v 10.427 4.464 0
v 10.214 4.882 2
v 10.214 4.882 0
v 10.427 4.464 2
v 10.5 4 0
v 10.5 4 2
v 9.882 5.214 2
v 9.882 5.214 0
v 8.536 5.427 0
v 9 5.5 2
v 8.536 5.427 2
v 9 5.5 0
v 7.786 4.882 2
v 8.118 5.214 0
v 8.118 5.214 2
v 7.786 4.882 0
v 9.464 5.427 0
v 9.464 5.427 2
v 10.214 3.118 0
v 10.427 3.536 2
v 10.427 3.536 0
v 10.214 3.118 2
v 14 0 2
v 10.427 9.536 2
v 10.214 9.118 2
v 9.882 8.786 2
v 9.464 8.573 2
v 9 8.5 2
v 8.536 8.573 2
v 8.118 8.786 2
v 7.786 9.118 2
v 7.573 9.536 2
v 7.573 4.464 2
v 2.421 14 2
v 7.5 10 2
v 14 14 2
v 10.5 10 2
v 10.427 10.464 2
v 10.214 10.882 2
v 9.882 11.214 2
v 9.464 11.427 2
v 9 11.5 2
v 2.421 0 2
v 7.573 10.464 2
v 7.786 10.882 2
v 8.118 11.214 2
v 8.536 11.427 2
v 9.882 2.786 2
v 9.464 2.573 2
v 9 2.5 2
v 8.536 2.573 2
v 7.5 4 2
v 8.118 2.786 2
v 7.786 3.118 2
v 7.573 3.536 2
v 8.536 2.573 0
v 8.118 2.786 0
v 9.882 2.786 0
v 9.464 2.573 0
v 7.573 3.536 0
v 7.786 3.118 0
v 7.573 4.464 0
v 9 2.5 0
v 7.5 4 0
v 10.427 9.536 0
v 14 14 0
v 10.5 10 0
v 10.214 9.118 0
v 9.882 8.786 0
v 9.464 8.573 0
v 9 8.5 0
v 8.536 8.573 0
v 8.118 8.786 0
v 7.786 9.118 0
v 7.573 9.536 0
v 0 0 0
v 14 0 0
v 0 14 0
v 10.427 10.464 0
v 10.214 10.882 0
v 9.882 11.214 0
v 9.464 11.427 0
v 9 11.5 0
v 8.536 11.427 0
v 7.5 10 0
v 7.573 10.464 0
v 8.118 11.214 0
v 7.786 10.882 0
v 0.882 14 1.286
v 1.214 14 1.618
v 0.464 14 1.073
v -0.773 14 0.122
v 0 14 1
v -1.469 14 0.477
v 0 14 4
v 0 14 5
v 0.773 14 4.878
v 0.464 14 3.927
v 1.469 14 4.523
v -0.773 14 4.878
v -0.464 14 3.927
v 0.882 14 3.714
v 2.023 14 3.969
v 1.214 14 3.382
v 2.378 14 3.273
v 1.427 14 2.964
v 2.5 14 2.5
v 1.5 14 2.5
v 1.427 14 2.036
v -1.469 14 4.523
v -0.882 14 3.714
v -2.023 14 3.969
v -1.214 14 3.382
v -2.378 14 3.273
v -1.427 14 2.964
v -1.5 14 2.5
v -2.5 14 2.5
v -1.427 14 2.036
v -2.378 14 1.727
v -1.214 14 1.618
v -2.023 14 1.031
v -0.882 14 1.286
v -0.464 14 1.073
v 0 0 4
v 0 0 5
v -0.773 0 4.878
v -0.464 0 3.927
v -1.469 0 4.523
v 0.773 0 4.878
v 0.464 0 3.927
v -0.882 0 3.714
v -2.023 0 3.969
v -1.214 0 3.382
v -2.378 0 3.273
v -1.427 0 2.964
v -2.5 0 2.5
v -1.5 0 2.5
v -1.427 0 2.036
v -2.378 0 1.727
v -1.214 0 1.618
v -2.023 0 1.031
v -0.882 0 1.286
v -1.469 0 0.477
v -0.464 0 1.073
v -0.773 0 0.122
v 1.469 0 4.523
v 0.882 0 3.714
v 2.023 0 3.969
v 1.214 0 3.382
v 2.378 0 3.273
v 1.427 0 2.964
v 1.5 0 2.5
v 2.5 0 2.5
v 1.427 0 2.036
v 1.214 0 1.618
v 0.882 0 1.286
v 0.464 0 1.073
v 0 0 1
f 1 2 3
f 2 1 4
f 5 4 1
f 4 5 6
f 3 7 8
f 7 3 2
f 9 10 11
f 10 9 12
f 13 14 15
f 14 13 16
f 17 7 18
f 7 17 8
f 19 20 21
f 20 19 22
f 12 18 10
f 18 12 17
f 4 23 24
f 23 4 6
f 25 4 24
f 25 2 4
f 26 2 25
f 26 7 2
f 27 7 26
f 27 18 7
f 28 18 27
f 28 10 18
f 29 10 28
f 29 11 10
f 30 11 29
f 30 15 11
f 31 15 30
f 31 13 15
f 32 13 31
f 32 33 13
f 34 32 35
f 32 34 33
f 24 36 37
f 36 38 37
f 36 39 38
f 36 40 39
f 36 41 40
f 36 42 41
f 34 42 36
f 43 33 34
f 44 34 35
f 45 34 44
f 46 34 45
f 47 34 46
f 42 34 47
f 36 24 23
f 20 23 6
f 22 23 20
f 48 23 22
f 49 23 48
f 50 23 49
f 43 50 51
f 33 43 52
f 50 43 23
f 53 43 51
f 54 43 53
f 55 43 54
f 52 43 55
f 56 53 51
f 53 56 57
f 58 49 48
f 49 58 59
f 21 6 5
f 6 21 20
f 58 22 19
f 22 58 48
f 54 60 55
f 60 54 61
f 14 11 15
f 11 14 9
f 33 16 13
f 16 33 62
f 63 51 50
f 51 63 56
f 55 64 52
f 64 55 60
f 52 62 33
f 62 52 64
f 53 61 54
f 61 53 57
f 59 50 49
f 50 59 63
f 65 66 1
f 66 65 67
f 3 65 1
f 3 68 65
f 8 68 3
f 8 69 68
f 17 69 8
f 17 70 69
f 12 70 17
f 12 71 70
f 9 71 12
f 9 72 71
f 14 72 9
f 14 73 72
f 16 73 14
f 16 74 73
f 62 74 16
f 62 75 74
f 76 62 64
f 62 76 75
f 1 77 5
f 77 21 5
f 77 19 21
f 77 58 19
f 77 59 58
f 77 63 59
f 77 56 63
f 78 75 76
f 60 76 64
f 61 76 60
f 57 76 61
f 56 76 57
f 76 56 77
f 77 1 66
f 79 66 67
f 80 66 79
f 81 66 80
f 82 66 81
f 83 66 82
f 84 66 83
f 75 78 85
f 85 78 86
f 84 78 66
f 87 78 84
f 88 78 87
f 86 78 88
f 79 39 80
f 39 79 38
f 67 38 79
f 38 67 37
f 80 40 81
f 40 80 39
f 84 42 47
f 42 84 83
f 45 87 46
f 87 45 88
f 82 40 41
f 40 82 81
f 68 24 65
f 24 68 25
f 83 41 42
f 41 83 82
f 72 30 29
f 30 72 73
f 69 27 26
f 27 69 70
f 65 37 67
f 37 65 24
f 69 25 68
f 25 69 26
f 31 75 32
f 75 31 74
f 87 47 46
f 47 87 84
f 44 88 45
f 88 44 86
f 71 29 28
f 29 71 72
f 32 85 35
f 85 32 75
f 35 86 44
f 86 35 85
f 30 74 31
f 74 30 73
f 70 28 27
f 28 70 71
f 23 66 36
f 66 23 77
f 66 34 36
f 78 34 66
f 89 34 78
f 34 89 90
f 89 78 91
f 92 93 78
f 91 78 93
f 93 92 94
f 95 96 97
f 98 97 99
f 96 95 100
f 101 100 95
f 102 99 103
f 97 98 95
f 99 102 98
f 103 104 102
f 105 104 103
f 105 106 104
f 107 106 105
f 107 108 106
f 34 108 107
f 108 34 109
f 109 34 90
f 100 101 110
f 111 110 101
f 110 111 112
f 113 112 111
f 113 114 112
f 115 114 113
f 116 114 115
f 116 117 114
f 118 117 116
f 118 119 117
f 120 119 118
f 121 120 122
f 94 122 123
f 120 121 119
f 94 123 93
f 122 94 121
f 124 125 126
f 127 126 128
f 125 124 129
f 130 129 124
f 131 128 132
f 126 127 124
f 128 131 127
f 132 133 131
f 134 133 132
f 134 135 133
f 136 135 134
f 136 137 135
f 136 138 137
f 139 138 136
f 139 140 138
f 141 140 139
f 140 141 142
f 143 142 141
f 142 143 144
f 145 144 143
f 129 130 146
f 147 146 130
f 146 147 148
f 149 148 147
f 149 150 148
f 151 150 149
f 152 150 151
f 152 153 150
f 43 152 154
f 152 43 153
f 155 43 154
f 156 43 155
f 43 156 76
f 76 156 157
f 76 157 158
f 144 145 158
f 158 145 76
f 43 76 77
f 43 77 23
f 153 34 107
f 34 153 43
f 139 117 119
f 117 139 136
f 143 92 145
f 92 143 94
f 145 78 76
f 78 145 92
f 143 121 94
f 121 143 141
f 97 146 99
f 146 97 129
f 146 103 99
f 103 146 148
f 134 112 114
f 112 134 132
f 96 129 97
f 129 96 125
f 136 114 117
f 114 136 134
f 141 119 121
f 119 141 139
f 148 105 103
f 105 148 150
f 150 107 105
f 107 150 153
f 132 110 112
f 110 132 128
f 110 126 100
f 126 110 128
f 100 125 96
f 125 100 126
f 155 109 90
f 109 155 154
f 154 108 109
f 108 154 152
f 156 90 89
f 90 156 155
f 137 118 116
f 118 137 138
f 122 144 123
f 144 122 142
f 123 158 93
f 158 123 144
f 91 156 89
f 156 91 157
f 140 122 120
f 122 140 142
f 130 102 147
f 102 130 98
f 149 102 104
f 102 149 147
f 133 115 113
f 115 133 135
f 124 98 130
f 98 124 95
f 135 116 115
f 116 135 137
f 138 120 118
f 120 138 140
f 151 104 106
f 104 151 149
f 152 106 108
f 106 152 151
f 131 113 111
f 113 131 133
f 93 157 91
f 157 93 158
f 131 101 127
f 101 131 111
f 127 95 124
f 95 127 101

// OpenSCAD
$fn=20;

module support()
{
    difference()
    {
        cube([14,14,2]);
        union()
        {
            translate([9,4,0]) cylinder(d=3,h=2);
            translate([9,4+6,0]) cylinder(d=3,h=2);
        }
    }
}

module cylindre_h(diametre,longueur)
{
    translate([0,0,2.5])
    rotate([-90,0,0])
        cylinder(d=diametre,h=longueur);
}

difference()
{
    union()
    {
        support();
        cylindre_h(3+2,14);
    }
    cylindre_h(3,14);
}
